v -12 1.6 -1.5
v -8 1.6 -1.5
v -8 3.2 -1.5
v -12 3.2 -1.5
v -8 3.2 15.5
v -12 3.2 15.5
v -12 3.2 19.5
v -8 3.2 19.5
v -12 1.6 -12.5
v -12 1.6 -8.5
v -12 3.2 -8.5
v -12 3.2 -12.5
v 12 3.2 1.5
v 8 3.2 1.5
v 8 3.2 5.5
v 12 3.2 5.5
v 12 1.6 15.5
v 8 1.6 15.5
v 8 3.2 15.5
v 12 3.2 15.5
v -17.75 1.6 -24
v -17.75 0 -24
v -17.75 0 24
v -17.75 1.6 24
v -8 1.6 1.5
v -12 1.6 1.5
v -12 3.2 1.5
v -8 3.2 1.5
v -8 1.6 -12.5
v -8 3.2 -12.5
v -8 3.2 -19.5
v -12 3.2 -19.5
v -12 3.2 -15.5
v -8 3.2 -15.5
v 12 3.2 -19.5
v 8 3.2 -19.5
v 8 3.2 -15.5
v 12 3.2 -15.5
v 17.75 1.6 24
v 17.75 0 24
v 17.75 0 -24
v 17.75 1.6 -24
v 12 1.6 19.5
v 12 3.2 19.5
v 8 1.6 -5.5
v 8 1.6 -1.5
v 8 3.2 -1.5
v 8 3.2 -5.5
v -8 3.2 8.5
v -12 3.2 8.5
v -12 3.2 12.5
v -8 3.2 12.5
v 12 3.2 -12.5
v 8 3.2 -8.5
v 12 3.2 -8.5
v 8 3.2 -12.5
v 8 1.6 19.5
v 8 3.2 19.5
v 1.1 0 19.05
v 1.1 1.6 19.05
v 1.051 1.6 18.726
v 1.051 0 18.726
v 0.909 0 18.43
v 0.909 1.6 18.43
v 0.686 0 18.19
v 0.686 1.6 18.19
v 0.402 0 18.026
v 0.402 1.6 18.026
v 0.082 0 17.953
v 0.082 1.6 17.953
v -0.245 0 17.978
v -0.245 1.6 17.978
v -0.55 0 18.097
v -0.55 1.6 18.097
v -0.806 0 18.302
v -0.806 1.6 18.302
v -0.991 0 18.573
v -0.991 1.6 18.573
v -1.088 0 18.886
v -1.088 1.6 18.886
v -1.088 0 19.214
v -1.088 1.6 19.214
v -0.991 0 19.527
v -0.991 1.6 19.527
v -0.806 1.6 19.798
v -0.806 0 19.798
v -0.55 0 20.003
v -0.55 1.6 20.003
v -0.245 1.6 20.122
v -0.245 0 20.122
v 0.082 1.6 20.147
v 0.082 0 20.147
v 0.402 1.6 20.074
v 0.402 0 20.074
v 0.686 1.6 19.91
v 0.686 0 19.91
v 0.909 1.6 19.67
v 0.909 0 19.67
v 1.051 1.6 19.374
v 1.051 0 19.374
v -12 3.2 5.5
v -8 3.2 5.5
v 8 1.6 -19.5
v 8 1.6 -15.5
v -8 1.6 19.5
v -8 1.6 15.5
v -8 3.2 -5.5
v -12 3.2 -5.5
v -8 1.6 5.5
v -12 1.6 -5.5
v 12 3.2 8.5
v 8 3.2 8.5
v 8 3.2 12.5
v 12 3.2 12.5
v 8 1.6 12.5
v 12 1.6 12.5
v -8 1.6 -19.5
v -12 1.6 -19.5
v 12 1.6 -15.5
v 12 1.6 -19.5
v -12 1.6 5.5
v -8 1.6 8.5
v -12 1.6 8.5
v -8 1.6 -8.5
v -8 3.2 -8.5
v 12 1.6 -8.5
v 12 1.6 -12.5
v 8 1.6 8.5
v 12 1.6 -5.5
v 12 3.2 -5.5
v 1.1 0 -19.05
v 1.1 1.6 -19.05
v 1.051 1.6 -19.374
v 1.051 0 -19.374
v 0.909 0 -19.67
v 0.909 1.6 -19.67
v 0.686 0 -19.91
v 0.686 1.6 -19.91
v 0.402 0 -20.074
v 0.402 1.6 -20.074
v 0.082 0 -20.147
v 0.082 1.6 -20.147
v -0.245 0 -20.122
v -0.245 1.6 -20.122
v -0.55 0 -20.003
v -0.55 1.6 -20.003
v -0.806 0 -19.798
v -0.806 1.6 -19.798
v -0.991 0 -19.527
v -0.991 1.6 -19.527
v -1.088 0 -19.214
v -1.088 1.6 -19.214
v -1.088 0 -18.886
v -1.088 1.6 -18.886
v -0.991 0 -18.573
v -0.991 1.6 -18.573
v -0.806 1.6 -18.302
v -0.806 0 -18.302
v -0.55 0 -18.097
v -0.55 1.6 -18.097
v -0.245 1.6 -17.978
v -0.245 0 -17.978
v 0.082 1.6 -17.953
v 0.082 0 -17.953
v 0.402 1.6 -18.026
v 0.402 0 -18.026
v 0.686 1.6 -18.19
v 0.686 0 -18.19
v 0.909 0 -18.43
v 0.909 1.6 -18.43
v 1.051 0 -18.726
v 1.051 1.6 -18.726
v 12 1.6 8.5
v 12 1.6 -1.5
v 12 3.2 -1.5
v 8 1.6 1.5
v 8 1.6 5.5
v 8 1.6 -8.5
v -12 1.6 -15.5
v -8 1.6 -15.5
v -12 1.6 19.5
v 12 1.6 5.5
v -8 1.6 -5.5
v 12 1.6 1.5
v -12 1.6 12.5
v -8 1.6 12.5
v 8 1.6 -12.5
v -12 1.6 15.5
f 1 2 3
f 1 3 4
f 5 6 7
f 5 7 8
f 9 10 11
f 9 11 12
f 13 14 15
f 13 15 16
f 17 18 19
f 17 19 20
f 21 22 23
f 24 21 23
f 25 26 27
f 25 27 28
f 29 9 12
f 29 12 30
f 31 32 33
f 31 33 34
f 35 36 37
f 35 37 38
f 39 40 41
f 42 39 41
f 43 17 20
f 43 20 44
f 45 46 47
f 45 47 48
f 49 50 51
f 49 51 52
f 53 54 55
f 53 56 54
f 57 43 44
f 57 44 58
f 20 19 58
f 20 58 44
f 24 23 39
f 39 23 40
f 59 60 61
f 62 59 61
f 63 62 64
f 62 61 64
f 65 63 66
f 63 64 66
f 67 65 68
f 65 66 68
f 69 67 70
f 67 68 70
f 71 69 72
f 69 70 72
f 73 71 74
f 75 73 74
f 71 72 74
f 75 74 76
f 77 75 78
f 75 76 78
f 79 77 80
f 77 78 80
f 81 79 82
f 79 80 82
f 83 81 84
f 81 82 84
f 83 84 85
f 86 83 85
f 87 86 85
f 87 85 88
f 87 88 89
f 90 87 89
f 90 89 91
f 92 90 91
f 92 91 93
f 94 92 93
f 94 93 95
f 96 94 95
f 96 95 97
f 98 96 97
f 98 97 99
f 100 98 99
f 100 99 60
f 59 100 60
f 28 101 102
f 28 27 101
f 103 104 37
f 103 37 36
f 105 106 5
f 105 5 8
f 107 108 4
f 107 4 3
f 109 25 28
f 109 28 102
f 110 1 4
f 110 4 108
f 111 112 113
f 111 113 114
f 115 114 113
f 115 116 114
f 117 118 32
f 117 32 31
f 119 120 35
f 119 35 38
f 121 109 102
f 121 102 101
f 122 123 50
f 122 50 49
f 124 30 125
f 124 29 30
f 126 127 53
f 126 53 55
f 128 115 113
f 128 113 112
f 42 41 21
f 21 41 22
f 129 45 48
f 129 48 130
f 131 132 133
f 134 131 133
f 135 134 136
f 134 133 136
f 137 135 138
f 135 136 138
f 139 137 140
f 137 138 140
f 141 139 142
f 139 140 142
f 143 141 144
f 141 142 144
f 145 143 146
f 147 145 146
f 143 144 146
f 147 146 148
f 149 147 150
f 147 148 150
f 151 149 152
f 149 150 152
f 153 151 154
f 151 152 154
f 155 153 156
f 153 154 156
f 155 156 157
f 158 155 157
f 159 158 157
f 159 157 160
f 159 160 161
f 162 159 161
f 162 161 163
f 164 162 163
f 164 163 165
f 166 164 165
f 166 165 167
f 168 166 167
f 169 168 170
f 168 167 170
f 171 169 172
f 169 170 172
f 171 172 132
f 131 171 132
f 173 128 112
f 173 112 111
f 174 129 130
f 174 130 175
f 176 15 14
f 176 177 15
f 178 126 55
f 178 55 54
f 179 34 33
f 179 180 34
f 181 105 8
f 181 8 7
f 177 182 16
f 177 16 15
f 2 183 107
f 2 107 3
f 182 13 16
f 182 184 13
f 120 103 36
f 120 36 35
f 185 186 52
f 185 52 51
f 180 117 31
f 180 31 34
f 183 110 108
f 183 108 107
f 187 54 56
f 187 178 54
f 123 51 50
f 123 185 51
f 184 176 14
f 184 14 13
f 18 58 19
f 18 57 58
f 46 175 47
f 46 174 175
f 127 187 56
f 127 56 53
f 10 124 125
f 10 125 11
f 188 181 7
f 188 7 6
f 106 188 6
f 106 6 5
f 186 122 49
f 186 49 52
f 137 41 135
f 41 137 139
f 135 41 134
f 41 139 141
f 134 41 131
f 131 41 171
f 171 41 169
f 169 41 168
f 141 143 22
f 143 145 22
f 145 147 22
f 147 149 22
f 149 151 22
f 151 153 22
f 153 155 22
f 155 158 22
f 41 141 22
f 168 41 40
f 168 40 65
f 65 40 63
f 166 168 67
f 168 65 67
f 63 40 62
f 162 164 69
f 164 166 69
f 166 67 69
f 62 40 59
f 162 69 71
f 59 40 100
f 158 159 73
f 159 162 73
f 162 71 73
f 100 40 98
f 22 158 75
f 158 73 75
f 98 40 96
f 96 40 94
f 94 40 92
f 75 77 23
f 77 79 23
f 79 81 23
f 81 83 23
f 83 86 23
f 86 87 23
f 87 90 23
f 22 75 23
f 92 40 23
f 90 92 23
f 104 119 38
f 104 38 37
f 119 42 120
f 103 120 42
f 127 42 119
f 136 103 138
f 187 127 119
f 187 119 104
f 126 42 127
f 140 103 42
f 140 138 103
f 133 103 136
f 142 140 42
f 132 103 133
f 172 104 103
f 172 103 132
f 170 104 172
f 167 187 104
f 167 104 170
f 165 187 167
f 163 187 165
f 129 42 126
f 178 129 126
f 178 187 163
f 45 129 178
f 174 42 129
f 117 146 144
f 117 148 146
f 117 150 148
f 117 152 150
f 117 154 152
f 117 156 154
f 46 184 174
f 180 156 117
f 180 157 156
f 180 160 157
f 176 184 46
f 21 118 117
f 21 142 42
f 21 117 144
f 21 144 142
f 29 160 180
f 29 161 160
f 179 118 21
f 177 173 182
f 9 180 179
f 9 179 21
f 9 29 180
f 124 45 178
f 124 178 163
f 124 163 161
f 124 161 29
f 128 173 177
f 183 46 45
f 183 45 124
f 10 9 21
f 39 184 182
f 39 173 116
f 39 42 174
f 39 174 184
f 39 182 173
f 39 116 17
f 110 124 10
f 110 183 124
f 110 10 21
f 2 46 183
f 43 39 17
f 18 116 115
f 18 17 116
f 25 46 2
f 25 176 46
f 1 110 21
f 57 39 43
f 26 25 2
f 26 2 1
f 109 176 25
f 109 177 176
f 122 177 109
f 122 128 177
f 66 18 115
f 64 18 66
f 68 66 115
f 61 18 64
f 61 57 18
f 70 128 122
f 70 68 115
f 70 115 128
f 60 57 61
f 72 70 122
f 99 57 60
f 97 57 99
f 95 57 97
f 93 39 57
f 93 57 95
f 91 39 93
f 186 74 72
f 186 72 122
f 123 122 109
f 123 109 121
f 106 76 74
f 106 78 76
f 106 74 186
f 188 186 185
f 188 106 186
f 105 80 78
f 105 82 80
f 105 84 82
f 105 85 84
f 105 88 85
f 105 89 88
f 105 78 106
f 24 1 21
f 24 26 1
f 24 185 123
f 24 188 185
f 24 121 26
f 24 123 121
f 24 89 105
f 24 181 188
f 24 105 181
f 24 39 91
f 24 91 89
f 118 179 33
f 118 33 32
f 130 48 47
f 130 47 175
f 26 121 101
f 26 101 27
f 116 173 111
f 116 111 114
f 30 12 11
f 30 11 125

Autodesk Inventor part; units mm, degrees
ref_plane "YZ Plane" through (0, 0, 0) normal (1, 0, 0) x (0, 1, 0)
ref_plane "XZ Plane" through (0, 0, 0) normal (0, 1, 0) x (-1, 0, 0)
ref_plane "XY Plane" through (0, 0, 0) normal (0, 0, 1) x (1, 0, 0)
sketch "Sketch1" plane through (0, 0, 0) normal (0, 1, 0) x (-1, 0, 0)
  line L0 (17.75, 24) -> (-17.75, 24)
  line L1 (-17.75, 24) -> (-17.75, -24)
  line L2 (-17.75, -24) -> (17.75, -24)
  line L3 (17.75, -24) -> (17.75, 24)
  line L4 (17.75, 24) -> (-17.75, -24) construction
  line L5 (-17.75, 24) -> (17.75, -24) construction
  point P0 (0, 0)
  dimension "d0" = 35.5
  dimension "d1" = 48
extrude "Extrusion1" add sketch "Sketch1" along normal blind 1.6
sketch "Sketch2" plane through (0, 1.6, 0) normal (0, 1, 0) x (1, 0, 0)
  line L0 (-12, 19.5) -> (-8, 19.5)
  line L1 (-8, 19.5) -> (-8, 15.5)
  line L2 (-8, 15.5) -> (-12, 15.5)
  line L3 (-12, 15.5) -> (-12, 19.5)
  line L4 (-12, 19.5) -> (-8, 15.5) construction
  line L5 (-8, 19.5) -> (-12, 15.5) construction
  line L6 (-17.75, -24) -> (17.75, -24) projected
  line L7 (17.75, 24) -> (-17.75, 24) projected
  line L8 (-17.75, 24) -> (-17.75, -24) projected
  line L9 (17.75, -24) -> (17.75, 24) projected
  line L10 (12, 15.5) -> (8, 15.5)
  line L11 (12, 19.5) -> (12, 15.5)
  line L12 (8, 19.5) -> (12, 19.5)
  line L13 (8, 15.5) -> (8, 19.5)
  line L14 (-8, 8.5) -> (-12, 8.5)
  line L15 (-8, 12.5) -> (-8, 8.5)
  line L16 (-12, 12.5) -> (-8, 12.5)
  line L17 (-12, 8.5) -> (-12, 12.5)
  line L18 (12, 8.5) -> (8, 8.5)
  line L19 (12, 12.5) -> (12, 8.5)
  line L20 (8, 12.5) -> (12, 12.5)
  line L21 (8, 8.5) -> (8, 12.5)
  line L22 (-8, 1.5) -> (-12, 1.5)
  line L23 (-8, 5.5) -> (-8, 1.5)
  line L24 (-12, 5.5) -> (-8, 5.5)
  line L25 (-12, 1.5) -> (-12, 5.5)
  line L26 (12, 1.5) -> (8, 1.5)
  line L27 (12, 5.5) -> (12, 1.5)
  line L28 (8, 5.5) -> (12, 5.5)
  line L29 (8, 1.5) -> (8, 5.5)
  line L30 (-8, -5.5) -> (-12, -5.5)
  line L31 (-8, -1.5) -> (-8, -5.5)
  line L32 (-12, -1.5) -> (-8, -1.5)
  line L33 (-12, -5.5) -> (-12, -1.5)
  line L34 (12, -5.5) -> (8, -5.5)
  line L35 (12, -1.5) -> (12, -5.5)
  line L36 (8, -1.5) -> (12, -1.5)
  line L37 (8, -5.5) -> (8, -1.5)
  line L38 (-8, -12.5) -> (-12, -12.5)
  line L39 (-8, -8.5) -> (-8, -12.5)
  line L40 (-12, -8.5) -> (-8, -8.5)
  line L41 (-12, -12.5) -> (-12, -8.5)
  line L42 (12, -12.5) -> (8, -12.5)
  line L43 (12, -8.5) -> (12, -12.5)
  line L44 (8, -8.5) -> (12, -8.5)
  line L45 (8, -12.5) -> (8, -8.5)
  line L46 (-8, -19.5) -> (-12, -19.5)
  line L47 (-8, -15.5) -> (-8, -19.5)
  line L48 (-12, -15.5) -> (-8, -15.5)
  line L49 (-12, -19.5) -> (-12, -15.5)
  line L50 (12, -19.5) -> (8, -19.5)
  line L51 (12, -15.5) -> (12, -19.5)
  line L52 (8, -15.5) -> (12, -15.5)
  line L53 (8, -19.5) -> (8, -15.5)
  point P0 (0, 0)
  point P1 (-10, 17.5)
  dimension "d4" = 4
  dimension "d5" = 4
  dimension "d6" = 48
  dimension "d7" = 35.5
  dimension "d8" = 17.5
  dimension "d9" = 10
  dimension "d20" = 20
  dimension "d23" = 7
extrude "Extrusion2" add sketch "Sketch2" along normal blind 1.6 contours L0 L1 L2 L3 | L10 L13 L12 L11 | L14 L17 L16 L15 | L18 L21 L20 L19 | L22 L25 L24 L23 | L26 L29 L28 L27 | L30 L33 L32 L31 | L34 L37 L36 L35 | L38 L41 L40 L39 | L42 L45 L44 L43 | L46 L49 L48 L47 | L50 L53 L52 L51
sketch "Sketch3" plane through (0, 1.6, 0) normal (0, 1, 0) x (1, 0, 0)
  line L0 (0, 0) -> (0, 19.05) construction
  line L1 (0, 0) -> (4.4844, 0) construction
  circle A0 centre (0, 19.05) radius 1.1
  circle A1 centre (0, -19.05) radius 1.1
  dimension "d28" = 19.05
  dimension "d29" = 2.2
extrude "Extrusion3" cut sketch "Sketch3" against normal through all
properties part number "RedLEDArray"
